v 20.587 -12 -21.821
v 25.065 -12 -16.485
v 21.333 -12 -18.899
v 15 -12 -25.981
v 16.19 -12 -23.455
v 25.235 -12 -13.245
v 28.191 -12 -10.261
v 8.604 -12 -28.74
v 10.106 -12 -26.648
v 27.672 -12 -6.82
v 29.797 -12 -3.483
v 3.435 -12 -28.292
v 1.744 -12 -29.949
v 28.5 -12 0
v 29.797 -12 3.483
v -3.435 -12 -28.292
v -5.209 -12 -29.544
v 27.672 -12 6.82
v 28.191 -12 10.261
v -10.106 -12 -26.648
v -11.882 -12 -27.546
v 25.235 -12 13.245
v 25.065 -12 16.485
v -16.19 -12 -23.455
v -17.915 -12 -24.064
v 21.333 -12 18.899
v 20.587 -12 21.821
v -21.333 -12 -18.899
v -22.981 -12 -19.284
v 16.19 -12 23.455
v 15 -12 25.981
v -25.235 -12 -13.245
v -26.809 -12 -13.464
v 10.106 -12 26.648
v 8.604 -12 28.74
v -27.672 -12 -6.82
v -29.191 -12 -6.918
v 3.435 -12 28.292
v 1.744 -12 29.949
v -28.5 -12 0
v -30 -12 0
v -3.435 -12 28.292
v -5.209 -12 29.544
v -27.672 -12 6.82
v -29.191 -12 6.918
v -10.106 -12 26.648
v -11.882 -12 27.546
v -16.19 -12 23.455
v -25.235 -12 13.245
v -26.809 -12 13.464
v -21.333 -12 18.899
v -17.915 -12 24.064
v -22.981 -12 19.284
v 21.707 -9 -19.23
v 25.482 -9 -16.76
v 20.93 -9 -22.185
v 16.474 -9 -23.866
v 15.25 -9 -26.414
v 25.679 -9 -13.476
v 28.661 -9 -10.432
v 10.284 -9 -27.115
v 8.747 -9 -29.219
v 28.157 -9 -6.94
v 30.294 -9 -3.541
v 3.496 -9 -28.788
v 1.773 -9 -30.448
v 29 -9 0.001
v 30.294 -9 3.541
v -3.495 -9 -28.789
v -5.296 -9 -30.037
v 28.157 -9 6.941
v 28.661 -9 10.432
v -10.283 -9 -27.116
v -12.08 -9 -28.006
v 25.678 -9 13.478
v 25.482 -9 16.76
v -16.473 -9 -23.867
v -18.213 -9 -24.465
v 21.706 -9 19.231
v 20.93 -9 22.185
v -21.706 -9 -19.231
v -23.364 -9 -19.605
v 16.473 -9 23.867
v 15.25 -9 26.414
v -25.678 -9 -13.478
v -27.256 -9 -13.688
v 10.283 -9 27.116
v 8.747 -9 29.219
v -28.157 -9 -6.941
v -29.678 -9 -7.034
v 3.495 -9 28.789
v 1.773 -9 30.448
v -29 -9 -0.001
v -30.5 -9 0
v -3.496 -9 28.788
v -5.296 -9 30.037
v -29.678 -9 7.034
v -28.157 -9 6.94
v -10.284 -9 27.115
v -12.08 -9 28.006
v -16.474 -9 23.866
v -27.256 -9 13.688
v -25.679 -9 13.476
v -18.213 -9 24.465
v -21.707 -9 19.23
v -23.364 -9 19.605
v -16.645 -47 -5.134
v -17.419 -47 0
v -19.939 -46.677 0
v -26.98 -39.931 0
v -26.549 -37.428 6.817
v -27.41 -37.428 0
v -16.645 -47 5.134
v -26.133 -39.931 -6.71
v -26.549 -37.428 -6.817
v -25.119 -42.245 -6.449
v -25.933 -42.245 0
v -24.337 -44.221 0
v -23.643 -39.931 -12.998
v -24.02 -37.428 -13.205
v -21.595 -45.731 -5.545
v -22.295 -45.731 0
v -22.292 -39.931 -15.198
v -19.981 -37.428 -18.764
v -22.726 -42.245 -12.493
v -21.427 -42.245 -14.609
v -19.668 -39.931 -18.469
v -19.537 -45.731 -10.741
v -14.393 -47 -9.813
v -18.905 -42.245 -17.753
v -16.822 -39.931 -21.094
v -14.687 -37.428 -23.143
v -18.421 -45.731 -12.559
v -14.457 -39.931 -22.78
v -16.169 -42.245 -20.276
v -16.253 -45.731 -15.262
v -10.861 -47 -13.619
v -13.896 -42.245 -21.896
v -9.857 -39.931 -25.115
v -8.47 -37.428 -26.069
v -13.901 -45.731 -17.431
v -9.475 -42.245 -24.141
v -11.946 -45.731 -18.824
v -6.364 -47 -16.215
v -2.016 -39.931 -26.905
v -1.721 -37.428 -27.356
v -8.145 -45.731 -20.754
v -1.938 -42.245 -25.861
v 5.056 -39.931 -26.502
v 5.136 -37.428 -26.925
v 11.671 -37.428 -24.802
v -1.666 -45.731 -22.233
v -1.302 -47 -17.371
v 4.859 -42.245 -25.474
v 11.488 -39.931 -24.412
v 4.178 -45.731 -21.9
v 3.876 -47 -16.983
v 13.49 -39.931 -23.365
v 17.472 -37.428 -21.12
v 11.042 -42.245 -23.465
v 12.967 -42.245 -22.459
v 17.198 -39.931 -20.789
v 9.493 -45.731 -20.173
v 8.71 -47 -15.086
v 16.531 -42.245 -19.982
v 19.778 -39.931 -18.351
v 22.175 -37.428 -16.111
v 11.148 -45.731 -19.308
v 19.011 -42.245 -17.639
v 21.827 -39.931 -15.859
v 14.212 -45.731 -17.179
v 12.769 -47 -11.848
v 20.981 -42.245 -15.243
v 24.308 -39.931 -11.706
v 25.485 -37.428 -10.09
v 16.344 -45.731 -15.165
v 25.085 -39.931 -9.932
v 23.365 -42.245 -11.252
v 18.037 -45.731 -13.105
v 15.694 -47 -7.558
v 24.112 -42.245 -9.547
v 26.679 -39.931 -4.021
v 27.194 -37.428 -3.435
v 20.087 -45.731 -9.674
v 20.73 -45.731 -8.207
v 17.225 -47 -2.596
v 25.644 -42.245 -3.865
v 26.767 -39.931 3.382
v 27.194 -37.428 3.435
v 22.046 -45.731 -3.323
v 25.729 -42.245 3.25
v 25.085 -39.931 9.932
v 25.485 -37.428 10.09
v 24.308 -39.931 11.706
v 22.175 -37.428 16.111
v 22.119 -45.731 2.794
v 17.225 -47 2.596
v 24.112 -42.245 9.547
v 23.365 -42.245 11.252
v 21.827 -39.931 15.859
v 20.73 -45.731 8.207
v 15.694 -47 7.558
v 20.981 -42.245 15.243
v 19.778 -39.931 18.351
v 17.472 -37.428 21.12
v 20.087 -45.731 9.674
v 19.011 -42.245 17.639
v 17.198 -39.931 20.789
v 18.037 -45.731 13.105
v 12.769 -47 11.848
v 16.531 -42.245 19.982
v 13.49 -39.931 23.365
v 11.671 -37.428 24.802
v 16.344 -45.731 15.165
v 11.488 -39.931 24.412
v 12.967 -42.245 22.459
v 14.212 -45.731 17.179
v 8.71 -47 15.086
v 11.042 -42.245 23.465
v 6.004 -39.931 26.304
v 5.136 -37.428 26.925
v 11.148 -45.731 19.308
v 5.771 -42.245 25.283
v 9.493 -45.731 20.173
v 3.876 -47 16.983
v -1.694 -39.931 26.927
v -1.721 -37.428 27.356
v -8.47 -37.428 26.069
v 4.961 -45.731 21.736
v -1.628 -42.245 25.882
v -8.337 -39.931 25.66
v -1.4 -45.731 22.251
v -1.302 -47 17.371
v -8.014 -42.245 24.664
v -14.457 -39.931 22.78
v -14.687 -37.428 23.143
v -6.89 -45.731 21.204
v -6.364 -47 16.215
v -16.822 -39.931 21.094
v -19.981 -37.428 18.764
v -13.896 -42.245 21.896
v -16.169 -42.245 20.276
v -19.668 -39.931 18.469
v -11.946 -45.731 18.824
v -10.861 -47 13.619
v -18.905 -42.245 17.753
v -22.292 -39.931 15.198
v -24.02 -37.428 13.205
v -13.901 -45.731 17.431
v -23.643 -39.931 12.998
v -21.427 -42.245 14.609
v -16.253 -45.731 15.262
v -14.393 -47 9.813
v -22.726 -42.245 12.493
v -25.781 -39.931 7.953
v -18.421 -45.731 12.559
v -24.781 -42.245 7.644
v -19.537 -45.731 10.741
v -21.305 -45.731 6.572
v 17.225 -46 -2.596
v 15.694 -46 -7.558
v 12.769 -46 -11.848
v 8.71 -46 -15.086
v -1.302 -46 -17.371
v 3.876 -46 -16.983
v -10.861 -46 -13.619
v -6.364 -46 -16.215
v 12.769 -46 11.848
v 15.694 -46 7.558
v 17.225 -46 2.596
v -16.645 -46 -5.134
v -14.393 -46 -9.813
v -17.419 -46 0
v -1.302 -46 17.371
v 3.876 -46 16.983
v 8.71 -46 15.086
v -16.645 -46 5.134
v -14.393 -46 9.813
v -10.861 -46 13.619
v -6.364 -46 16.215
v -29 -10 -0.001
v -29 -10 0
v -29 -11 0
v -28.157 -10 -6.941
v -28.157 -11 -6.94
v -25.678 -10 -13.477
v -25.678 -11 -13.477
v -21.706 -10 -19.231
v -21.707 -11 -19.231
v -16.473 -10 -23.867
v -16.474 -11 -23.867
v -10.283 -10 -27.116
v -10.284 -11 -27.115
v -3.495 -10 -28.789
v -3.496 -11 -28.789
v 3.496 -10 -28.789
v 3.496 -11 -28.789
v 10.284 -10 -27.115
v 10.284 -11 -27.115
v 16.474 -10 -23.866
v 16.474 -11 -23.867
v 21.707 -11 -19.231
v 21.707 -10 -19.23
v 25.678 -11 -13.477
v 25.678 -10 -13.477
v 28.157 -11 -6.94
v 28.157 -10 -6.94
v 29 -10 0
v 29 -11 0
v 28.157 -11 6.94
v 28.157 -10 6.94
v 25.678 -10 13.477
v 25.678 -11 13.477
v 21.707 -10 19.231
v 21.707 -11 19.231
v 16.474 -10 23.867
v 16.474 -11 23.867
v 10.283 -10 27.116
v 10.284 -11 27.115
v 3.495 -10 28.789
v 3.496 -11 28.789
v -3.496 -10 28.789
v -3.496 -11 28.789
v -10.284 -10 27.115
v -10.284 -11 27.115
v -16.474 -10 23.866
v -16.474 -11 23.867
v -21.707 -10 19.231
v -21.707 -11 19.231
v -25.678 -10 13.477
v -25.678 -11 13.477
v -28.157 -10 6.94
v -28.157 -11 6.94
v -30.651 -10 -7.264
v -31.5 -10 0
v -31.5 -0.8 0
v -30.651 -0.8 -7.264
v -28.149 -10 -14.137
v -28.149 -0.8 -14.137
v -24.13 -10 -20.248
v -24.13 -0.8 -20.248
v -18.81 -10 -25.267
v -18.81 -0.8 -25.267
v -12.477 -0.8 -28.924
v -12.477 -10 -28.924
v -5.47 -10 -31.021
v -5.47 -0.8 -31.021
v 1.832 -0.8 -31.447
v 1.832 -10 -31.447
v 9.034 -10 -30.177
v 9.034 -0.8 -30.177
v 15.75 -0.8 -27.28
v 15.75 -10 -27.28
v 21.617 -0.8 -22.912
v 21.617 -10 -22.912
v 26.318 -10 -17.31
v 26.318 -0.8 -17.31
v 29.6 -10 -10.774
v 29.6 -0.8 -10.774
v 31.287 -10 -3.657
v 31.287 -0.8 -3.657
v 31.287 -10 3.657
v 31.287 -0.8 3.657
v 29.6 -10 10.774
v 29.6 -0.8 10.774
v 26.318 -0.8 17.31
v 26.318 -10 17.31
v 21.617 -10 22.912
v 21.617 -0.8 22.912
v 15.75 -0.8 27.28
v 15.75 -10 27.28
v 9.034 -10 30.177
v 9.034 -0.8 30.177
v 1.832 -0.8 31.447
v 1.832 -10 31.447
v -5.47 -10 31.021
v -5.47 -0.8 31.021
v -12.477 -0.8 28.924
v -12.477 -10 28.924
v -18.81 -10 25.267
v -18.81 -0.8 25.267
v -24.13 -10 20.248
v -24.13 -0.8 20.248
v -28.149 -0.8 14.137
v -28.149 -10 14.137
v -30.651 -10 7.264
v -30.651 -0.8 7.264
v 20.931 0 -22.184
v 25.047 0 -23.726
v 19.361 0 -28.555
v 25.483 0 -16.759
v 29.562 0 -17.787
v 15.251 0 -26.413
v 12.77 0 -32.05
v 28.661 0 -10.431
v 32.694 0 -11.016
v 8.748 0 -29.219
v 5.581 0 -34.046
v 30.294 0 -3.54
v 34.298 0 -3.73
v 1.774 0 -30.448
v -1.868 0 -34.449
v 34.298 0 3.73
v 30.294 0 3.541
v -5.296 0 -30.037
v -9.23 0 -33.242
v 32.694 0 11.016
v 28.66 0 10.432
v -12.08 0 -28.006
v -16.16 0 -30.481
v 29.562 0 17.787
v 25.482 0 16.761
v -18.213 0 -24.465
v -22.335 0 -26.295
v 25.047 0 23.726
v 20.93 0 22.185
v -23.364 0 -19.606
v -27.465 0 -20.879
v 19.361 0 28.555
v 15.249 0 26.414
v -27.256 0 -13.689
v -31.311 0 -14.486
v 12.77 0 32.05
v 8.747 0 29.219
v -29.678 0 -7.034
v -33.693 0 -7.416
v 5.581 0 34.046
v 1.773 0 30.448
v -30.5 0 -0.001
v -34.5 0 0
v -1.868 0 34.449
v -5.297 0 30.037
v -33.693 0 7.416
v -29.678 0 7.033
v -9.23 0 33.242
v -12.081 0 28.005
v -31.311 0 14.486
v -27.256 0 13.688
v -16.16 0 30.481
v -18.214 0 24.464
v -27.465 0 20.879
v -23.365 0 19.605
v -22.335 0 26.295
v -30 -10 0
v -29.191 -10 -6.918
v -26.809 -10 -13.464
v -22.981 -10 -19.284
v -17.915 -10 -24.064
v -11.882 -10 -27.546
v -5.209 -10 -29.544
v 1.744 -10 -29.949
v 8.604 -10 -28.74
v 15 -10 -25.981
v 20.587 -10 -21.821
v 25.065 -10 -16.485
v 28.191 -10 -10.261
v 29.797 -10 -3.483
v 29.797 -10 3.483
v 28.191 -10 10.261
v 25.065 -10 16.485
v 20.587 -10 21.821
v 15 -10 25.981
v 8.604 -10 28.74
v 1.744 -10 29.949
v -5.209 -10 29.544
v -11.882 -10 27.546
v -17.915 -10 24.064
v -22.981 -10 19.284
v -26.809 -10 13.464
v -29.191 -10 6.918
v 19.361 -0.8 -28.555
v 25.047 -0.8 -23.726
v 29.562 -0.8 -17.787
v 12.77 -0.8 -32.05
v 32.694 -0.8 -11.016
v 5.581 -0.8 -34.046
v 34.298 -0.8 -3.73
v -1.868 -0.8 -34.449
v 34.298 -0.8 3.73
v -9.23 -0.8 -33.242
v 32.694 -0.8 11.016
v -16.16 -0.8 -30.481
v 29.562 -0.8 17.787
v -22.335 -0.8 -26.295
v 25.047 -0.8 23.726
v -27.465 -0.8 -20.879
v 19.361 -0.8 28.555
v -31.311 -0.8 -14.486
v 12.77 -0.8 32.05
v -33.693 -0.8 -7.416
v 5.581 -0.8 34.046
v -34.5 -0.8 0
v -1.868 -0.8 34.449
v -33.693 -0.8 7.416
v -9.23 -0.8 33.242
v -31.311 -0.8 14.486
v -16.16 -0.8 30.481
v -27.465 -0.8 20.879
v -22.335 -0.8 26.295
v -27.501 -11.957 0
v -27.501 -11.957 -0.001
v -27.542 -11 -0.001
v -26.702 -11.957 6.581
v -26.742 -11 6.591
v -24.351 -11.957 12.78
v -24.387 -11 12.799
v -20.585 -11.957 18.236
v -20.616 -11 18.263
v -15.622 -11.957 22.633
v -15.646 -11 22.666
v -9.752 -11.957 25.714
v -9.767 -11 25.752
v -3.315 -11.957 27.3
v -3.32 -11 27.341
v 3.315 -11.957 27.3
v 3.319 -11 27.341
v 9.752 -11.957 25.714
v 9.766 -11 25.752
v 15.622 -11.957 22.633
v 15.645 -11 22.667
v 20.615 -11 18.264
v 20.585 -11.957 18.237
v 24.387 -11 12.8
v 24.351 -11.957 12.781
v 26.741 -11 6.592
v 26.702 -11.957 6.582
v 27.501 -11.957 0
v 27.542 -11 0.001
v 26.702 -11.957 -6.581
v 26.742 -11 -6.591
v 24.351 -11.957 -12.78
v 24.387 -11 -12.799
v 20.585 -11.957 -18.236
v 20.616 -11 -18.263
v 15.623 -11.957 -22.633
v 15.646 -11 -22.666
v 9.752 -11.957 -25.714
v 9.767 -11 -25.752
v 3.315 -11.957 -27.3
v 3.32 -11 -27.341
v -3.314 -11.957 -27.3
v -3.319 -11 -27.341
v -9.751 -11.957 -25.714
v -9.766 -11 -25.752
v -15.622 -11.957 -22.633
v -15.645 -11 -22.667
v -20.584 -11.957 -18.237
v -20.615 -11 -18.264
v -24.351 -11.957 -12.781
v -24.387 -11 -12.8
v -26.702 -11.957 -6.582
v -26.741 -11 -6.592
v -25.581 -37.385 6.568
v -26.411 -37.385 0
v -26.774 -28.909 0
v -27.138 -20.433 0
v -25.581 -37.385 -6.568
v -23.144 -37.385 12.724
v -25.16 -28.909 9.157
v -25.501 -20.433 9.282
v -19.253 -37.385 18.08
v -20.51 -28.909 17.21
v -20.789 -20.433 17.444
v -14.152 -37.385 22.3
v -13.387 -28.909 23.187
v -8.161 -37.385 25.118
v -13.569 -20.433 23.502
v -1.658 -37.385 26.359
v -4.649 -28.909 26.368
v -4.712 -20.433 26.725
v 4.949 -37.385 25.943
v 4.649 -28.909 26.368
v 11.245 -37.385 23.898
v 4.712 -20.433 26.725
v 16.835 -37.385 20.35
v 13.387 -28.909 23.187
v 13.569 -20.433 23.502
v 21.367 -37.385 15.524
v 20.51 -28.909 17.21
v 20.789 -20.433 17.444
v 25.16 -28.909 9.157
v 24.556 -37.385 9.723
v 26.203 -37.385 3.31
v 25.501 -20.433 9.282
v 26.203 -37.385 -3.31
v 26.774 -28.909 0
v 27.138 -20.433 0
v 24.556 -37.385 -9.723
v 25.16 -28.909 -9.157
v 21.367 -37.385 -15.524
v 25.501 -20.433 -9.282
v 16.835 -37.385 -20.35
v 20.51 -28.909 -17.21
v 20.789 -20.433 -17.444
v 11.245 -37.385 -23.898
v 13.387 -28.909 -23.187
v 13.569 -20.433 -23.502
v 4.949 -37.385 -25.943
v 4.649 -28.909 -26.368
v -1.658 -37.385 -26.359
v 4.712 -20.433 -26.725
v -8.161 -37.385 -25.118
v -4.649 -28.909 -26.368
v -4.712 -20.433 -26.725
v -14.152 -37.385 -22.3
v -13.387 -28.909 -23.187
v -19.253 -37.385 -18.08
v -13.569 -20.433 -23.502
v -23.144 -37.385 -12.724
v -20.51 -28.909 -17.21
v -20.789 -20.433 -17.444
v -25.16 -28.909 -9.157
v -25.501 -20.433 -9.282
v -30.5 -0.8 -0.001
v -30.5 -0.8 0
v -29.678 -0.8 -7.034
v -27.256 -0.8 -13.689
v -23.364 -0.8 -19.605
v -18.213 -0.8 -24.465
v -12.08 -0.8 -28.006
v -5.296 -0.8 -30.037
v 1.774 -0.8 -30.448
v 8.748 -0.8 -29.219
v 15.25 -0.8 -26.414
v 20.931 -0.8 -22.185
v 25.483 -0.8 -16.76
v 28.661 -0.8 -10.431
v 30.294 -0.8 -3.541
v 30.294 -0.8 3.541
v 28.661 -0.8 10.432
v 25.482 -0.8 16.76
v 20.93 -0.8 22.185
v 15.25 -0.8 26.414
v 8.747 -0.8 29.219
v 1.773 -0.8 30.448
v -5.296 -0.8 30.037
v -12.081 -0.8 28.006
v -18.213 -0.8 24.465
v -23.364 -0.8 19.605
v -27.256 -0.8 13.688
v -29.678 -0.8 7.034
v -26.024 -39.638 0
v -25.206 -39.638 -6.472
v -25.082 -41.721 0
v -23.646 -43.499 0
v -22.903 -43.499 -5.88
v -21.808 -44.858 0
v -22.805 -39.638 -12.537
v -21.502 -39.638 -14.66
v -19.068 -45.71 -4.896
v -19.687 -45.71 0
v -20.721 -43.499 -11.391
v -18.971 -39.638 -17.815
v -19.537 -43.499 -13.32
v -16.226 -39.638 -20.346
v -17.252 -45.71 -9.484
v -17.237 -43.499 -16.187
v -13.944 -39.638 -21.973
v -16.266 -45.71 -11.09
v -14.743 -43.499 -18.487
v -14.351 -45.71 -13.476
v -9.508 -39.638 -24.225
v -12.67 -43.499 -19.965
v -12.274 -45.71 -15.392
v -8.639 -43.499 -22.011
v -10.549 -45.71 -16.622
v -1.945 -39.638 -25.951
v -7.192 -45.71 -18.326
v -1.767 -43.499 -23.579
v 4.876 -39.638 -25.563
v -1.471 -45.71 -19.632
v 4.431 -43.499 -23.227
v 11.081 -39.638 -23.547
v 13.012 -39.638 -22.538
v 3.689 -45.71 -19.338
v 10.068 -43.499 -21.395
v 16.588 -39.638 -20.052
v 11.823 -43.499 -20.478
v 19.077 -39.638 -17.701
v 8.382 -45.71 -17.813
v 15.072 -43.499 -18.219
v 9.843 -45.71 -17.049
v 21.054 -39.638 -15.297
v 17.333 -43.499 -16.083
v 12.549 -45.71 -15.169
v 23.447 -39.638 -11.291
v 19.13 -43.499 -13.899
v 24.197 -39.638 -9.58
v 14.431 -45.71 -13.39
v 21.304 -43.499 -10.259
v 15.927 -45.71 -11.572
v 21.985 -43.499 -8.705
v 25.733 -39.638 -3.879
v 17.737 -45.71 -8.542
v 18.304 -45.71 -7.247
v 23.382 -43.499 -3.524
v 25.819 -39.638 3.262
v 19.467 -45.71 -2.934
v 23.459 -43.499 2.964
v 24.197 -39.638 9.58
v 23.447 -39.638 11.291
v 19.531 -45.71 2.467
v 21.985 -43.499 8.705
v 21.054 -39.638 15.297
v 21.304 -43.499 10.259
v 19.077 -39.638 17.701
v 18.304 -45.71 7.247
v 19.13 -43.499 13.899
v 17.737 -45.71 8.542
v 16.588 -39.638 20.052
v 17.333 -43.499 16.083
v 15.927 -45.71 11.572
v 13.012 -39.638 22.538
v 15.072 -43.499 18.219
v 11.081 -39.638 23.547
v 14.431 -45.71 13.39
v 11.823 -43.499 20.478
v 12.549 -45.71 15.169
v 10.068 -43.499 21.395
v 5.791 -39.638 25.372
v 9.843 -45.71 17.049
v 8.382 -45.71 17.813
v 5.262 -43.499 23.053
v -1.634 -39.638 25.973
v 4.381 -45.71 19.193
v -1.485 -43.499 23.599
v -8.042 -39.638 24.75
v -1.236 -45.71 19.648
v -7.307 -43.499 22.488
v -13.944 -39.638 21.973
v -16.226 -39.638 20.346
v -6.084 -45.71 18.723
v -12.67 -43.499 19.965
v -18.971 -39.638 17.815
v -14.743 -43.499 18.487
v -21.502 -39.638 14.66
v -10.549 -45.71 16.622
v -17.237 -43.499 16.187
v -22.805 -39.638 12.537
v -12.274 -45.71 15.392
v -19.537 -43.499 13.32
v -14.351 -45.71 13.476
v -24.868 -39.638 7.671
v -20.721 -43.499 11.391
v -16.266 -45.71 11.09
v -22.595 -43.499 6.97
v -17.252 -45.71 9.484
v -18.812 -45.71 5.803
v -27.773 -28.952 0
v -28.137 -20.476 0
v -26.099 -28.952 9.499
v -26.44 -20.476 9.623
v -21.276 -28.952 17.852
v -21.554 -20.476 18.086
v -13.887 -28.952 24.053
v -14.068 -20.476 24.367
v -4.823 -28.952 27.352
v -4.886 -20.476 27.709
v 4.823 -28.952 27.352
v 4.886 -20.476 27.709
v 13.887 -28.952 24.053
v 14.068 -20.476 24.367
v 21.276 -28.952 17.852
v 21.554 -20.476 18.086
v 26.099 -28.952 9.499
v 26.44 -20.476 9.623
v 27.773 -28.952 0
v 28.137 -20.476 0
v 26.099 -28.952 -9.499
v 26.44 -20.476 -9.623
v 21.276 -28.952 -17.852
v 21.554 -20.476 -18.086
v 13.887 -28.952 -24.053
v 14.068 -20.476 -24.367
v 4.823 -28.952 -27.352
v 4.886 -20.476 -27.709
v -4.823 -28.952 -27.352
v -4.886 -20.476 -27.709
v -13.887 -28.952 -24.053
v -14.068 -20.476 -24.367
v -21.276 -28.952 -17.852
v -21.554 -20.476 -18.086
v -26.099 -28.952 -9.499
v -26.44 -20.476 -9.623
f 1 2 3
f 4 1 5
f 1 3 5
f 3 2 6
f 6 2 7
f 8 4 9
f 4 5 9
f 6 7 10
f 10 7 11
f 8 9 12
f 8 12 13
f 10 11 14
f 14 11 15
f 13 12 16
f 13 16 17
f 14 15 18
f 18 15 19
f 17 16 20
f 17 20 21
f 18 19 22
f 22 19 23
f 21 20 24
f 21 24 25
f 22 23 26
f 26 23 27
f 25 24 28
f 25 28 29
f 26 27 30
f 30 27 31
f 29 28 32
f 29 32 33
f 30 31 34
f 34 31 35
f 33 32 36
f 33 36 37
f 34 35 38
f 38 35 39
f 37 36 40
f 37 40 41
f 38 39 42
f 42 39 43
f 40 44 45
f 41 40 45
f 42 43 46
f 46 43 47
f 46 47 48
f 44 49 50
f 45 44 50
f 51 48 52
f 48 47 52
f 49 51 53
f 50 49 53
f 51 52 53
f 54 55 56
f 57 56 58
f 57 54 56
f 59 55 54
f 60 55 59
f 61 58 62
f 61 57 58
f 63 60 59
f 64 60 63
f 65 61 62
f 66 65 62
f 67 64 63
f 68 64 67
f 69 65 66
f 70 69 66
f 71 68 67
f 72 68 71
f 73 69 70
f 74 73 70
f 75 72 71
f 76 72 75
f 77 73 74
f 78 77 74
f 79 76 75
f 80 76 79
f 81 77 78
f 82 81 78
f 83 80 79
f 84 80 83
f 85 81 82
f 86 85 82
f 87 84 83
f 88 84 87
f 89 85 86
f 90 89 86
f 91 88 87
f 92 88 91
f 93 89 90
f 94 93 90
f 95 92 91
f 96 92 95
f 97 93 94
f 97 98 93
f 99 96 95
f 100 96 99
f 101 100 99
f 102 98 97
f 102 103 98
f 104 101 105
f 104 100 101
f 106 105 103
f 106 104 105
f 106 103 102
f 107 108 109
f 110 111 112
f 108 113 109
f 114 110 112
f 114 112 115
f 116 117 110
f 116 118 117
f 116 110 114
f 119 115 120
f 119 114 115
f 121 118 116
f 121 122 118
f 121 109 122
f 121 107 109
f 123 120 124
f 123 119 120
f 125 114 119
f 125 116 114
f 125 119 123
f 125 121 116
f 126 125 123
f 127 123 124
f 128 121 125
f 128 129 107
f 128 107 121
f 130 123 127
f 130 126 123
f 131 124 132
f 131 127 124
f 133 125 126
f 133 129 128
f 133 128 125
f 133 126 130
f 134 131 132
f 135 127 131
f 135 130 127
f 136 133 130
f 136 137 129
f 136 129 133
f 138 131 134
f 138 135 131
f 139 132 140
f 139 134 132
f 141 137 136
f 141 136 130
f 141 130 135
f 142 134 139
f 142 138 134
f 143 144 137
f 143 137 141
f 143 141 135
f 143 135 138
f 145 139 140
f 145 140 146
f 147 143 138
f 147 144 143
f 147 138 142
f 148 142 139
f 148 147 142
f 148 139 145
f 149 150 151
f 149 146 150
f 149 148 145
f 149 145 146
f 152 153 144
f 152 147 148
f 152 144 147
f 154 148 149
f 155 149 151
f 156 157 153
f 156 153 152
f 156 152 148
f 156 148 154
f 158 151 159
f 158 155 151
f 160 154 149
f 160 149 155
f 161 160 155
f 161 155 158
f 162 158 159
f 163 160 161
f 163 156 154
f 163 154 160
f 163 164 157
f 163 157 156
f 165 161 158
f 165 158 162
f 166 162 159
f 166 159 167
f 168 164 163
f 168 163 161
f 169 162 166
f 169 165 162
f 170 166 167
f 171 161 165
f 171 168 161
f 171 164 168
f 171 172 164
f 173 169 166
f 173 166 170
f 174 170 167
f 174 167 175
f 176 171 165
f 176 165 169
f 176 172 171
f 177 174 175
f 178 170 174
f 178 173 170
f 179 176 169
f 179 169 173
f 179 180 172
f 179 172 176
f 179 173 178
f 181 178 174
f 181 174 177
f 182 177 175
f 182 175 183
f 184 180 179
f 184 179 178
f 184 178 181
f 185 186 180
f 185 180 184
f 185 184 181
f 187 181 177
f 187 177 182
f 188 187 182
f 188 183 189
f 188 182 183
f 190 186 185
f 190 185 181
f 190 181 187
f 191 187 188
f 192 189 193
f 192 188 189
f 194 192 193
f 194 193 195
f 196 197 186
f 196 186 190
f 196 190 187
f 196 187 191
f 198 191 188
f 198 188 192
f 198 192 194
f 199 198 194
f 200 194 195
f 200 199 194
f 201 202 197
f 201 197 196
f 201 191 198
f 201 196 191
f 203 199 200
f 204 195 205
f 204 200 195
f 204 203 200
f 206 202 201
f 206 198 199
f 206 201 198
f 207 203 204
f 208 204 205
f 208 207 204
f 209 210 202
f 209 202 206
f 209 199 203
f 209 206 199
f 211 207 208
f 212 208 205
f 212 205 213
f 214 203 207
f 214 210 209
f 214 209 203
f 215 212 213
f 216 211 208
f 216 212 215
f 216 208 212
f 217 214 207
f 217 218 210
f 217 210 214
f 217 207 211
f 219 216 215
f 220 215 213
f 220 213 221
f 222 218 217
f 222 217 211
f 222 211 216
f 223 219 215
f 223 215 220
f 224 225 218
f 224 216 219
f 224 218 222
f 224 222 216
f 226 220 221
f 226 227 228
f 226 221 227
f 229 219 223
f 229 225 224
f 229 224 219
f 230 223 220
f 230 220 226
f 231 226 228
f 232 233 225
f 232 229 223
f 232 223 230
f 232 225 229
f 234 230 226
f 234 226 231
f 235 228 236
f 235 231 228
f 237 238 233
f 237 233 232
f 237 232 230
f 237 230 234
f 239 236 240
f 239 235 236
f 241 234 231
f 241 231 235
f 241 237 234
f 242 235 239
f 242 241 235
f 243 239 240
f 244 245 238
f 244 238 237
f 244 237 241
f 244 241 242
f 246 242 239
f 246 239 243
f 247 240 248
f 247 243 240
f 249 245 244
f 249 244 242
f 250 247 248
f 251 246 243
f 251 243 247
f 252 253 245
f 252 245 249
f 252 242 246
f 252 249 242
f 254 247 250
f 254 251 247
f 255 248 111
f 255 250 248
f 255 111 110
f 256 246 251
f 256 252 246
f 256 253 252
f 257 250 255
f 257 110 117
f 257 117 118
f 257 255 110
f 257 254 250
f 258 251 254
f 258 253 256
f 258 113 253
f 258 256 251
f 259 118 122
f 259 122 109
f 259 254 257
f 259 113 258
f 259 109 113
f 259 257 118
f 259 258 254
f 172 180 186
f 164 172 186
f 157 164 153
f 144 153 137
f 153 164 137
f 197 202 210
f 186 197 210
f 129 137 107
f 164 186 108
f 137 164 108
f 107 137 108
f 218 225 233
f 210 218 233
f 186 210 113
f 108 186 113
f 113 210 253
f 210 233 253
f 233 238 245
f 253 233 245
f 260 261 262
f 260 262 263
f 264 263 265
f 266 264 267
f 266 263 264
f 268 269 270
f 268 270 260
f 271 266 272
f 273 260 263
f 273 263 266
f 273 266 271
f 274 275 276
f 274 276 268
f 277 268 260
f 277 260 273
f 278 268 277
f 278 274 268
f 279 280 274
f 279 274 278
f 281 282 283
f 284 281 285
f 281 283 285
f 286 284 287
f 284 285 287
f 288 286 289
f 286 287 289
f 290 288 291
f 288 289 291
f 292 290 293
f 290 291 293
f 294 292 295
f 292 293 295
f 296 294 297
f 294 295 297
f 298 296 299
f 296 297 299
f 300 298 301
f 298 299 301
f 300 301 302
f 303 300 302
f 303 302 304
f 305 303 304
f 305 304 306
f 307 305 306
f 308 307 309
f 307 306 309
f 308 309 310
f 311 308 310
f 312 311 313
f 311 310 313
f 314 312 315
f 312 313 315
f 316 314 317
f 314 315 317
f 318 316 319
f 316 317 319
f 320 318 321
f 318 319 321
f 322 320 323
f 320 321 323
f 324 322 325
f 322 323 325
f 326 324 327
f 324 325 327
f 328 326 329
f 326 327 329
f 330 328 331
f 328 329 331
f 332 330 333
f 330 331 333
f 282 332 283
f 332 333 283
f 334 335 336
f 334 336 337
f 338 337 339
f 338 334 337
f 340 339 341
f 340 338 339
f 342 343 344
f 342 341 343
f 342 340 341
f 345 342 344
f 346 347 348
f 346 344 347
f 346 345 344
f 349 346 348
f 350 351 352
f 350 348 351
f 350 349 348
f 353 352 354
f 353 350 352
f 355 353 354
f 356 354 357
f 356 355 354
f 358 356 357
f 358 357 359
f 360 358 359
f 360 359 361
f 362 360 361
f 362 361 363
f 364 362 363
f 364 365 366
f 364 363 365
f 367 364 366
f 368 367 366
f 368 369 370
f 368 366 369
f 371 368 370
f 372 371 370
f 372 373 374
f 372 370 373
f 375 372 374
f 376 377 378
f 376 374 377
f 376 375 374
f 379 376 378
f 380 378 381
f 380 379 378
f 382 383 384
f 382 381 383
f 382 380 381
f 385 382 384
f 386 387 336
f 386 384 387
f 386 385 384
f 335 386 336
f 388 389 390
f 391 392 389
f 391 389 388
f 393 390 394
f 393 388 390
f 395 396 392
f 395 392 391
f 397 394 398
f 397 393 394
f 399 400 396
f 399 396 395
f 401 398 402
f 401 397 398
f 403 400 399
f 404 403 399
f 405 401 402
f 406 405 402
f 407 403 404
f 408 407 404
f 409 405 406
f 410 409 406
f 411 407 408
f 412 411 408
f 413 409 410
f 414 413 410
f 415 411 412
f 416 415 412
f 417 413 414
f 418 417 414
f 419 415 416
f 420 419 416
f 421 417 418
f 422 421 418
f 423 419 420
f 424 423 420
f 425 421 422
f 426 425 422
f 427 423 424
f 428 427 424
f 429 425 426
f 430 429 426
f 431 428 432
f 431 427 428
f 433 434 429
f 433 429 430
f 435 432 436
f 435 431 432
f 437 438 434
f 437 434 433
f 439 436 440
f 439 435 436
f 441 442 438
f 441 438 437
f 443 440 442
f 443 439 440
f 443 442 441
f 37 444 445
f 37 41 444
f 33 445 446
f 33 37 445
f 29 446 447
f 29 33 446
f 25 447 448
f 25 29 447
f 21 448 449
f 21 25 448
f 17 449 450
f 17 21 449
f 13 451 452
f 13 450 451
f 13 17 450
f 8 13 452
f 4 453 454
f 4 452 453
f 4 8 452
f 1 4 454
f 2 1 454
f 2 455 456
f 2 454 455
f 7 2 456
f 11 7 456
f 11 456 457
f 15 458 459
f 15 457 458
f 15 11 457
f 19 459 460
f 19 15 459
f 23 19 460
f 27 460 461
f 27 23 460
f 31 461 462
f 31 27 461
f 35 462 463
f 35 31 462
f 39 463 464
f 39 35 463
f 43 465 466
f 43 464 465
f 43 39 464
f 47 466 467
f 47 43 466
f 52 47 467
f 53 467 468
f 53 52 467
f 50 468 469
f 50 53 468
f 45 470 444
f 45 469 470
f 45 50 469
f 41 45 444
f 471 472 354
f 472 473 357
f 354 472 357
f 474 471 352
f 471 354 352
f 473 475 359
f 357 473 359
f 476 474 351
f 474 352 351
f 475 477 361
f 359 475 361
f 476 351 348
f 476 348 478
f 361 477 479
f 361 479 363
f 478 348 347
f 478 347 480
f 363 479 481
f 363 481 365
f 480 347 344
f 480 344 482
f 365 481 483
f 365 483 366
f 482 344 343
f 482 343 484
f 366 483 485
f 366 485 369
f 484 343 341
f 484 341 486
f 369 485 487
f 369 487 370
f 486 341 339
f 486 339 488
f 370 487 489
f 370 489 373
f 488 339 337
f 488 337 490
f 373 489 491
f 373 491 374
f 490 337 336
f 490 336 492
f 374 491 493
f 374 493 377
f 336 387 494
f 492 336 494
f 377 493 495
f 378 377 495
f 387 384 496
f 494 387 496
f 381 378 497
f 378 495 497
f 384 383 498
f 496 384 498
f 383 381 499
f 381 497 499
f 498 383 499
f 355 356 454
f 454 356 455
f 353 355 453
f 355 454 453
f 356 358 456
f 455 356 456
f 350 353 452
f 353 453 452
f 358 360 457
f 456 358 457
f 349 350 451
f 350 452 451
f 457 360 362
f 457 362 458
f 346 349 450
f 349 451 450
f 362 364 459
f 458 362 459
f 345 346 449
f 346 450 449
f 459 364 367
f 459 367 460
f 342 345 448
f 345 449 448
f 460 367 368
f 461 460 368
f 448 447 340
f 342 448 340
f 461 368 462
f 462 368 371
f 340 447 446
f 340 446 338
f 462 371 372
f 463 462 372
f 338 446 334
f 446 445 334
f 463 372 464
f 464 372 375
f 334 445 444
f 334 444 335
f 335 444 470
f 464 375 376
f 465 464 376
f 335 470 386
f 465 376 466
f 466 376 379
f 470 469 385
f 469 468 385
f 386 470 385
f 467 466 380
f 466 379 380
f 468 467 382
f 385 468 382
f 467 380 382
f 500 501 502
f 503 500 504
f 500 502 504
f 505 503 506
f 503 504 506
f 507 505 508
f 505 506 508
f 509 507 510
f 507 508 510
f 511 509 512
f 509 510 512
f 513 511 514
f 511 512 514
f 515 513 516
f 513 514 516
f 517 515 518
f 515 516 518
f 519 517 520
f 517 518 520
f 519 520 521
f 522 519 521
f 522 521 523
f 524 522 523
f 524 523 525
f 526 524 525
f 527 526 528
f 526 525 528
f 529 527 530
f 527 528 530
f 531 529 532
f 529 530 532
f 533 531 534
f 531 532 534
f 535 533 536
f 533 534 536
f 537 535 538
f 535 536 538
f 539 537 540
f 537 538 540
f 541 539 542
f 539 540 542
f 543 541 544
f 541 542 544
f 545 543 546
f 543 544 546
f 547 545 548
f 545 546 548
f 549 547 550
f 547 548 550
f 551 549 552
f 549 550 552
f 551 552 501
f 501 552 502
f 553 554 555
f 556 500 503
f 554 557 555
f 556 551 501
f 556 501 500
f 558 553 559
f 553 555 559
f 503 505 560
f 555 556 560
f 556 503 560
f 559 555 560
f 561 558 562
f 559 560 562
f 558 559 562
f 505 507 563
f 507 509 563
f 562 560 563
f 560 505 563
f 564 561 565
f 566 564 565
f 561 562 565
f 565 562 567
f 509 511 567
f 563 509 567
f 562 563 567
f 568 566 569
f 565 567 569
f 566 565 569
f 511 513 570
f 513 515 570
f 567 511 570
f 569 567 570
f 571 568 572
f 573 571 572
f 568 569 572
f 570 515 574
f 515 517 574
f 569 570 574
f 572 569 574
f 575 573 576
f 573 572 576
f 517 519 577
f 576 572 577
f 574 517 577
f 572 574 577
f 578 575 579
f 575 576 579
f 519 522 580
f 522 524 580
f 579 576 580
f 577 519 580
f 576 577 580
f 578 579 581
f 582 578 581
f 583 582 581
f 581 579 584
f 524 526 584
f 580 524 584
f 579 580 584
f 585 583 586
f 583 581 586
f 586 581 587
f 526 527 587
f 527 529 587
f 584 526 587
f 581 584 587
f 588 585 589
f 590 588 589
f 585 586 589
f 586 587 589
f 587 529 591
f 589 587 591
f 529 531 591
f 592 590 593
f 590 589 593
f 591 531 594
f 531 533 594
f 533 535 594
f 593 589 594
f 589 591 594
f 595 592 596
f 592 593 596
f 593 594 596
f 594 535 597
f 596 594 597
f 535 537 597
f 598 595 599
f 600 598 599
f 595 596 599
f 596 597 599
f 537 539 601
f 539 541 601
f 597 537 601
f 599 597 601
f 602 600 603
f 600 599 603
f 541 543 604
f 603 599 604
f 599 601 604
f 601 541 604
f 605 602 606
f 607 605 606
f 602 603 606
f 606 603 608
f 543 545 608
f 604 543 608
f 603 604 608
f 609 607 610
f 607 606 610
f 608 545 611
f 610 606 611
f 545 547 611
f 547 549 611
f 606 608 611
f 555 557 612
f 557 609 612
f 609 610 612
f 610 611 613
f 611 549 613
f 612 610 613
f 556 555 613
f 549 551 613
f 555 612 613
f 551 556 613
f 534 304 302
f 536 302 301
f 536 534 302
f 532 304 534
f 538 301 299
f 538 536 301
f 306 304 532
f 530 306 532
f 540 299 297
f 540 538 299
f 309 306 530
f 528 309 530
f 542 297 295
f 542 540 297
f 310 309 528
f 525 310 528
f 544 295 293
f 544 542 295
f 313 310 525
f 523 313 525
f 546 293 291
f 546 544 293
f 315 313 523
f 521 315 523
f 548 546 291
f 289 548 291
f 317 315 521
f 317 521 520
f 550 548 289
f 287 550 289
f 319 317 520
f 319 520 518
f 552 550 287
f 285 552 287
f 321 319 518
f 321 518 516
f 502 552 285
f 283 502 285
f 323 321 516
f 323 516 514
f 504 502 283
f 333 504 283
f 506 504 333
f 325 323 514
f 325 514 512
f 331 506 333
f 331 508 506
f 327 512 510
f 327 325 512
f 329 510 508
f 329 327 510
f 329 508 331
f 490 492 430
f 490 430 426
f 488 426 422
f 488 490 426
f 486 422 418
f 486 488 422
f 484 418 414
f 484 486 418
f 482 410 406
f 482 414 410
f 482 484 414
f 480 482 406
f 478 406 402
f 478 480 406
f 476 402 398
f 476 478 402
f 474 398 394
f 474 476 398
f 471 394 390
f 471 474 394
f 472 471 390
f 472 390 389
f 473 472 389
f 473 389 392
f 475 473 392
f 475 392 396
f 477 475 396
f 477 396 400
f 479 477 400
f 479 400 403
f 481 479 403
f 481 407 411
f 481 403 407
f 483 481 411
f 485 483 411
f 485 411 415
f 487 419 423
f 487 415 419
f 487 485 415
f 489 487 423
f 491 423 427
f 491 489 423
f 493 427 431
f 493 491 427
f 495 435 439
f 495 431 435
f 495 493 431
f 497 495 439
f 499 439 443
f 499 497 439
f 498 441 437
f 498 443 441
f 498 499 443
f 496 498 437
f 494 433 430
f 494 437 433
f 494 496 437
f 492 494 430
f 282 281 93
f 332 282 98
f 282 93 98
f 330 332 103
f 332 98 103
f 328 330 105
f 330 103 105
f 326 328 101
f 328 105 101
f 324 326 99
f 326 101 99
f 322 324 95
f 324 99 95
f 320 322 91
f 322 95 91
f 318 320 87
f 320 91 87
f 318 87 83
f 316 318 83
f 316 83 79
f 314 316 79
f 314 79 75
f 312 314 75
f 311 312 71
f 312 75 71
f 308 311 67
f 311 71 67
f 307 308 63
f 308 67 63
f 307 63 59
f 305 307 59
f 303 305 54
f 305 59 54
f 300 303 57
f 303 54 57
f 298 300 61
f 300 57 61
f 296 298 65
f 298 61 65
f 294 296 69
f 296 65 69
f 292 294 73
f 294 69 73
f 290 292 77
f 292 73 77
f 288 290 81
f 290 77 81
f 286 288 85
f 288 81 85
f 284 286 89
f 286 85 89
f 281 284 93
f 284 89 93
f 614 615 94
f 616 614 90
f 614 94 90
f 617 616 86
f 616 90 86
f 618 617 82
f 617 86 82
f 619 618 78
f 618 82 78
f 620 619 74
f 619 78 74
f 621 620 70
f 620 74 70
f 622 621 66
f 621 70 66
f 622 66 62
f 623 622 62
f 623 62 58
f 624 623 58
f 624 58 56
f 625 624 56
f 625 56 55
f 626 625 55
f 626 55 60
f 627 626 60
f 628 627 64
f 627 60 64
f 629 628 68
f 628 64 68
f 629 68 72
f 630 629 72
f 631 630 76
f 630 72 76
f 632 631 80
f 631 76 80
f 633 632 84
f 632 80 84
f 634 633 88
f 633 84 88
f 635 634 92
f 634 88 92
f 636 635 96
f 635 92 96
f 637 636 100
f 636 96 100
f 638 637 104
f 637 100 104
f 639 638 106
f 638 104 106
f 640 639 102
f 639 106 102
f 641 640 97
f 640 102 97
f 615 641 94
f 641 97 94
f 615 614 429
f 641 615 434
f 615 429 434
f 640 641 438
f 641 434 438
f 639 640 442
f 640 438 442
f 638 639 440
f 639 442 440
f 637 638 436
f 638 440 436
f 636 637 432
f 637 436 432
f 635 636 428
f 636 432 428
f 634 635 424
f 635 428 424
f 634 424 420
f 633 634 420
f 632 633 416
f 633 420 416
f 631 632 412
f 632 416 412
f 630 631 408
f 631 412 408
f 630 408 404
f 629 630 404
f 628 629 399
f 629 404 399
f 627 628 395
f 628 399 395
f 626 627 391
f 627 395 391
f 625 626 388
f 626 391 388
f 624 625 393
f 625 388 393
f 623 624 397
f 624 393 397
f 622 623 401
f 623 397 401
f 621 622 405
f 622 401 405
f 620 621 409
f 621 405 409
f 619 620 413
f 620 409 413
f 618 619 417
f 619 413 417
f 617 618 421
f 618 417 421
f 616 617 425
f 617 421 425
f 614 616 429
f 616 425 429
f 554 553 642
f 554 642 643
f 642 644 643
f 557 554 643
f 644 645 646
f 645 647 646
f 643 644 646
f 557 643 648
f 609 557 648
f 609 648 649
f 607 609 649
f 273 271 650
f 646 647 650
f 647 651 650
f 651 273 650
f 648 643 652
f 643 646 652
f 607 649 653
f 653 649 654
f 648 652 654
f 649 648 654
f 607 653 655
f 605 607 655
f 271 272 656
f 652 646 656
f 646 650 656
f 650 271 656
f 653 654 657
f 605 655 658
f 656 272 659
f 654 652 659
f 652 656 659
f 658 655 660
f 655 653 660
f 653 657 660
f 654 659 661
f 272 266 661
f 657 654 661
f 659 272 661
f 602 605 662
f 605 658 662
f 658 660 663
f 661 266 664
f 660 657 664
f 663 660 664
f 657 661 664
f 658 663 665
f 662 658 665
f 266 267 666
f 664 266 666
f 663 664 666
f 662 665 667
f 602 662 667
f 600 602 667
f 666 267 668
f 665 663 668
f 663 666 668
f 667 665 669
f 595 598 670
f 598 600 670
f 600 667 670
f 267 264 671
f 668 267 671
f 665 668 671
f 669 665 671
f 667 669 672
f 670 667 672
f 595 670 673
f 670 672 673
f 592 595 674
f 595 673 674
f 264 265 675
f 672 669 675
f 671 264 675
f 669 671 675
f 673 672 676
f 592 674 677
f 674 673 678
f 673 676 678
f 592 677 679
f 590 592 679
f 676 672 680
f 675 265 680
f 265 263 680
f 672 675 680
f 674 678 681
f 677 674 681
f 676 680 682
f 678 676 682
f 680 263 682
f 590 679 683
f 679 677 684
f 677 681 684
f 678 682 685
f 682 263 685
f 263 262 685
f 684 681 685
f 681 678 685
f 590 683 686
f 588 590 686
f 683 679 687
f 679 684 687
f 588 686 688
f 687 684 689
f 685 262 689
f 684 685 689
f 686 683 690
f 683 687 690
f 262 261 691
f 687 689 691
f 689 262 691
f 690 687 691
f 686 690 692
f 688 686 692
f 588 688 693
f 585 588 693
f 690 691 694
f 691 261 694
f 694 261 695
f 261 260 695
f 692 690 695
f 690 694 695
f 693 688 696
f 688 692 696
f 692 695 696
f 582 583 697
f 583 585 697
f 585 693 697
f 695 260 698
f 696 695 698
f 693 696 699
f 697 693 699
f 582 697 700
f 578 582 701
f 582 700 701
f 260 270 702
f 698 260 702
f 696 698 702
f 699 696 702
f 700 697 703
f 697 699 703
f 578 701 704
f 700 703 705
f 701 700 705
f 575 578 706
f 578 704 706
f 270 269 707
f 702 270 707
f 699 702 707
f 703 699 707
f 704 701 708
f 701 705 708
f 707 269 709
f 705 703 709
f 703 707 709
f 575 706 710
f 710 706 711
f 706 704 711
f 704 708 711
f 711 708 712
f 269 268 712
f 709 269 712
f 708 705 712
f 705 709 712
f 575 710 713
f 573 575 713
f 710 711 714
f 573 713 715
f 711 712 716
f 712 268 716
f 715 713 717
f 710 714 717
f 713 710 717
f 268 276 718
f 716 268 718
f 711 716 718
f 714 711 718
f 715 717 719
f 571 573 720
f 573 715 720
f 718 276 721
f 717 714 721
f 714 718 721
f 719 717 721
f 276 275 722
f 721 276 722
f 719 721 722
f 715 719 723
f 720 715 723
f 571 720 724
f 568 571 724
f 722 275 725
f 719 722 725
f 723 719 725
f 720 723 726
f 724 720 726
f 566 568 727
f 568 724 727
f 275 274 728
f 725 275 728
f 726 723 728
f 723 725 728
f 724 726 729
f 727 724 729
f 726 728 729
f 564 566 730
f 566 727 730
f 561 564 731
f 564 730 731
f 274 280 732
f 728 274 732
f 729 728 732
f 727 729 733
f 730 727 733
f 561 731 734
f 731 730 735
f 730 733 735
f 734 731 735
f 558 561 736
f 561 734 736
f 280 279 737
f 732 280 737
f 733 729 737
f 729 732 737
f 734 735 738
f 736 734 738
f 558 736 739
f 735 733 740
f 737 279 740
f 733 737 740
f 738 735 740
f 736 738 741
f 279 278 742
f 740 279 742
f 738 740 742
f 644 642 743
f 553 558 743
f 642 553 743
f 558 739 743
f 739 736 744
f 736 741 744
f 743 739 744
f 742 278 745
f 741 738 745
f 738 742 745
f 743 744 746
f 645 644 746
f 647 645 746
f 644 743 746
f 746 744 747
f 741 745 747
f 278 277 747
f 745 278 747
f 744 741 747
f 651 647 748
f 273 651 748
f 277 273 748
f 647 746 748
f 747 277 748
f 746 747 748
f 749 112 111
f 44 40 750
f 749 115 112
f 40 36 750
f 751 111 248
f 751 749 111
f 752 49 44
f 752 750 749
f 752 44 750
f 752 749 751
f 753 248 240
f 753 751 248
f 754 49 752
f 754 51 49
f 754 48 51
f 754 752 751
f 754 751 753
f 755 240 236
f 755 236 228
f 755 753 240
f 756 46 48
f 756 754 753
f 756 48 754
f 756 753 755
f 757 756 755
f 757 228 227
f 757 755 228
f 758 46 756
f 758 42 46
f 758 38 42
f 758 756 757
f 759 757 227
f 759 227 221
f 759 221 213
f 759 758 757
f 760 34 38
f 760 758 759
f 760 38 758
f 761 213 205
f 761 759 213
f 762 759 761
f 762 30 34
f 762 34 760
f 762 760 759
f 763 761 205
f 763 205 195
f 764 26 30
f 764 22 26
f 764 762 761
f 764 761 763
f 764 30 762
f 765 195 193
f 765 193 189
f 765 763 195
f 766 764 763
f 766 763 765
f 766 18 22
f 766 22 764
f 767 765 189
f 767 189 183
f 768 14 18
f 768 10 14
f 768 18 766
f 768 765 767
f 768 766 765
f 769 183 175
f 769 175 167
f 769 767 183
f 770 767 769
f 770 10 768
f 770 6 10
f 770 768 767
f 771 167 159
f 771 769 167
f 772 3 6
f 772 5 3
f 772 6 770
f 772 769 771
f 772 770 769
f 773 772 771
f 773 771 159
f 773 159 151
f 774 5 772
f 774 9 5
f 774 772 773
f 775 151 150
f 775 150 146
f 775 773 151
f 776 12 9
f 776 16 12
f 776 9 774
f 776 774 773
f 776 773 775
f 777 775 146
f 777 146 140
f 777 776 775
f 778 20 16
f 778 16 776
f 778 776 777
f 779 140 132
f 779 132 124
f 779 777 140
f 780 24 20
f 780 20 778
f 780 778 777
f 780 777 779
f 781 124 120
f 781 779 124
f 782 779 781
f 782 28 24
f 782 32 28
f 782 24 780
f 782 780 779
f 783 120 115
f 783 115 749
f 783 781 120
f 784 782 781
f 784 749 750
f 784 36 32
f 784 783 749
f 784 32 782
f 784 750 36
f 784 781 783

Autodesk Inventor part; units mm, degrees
ref_plane "YZ Plane" through (0, 0, 0) normal (1, 0, 0) x (0, 1, 0)
ref_plane "XZ Plane" through (0, 0, 0) normal (0, 1, 0) x (-1, 0, 0)
ref_plane "XY Plane" through (0, 0, 0) normal (0, 0, 1) x (1, 0, 0)
sketch "草圖1" plane through (0, 0, 0) normal (0, 0, 1) x (1, 0, 0)
  line L0 (0, 0) -> (-34.5, 0)
  line L1 (-34.5, 0) -> (-34.5, -0.8)
  line L2 (-34.5, -0.8) -> (0, -0.8)
  line L3 (0, -0.8) -> (0, 0)
  line L4 (0, -0.8) -> (-31.5, -0.8)
  line L5 (-31.5, -0.8) -> (-31.5, -10)
  line L6 (-31.5, -10) -> (0, -10)
  line L7 (0, -10) -> (0, -0.8)
  line L8 (0, -10) -> (-30, -10)
  line L9 (-30, -10) -> (-30, -12)
  line L10 (-30, -12) -> (0, -12)
  line L11 (0, -12) -> (0, -10)
  line L12 (-18.0931, -47) -> (0, -47)
  line L13 (0, -47) -> (0, -12)
  line L14 (0, -47) -> (-20, -47)
  line L15 (-20, -47) -> (-20, -50)
  line L16 (-20, -50) -> (0, -50)
  line L17 (0, -50) -> (0, -47)
  line L18 (0, -50) -> (-19.9, -50)
  line L19 (-19.9, -50) -> (-19.9, -55)
  line L20 (-19.9, -55) -> (0, -55)
  line L21 (0, -55) -> (0, -50)
  line L22 (0, -47) -> (-27, -47)
  line L23 (-27, -47) -> (-28.5, -12)
  dimension "d0" = 0.8
  dimension "d1" = 34.5
  dimension "d2" = 20
  dimension "d3" = 31.5
  dimension "d4" = 30
  dimension "d5" = 9.2
  dimension "d6" = 2
  dimension "d8" = 3
  dimension "d9" = 28.5
  dimension "d10" = 27
  dimension "d11" = 19.9
  dimension "d12" = 35
  dimension "d13" = 5
revolve "迴轉1" add sketch "草圖1" angle 360 about axis through (0, -47, 0) along (0, 1, 0) contours L3 L2 L1 L0 | L7 L6 L5 L2 | L11 L10 L9 L6 | L13 L12 L14 L22 L23 L10
fillet "圓角1" radius 10 1 edges at (27, -47, 0)
shell "薄殼1" thickness 1 removed faces 1 at (11.3362, 0, -5.1612)
properties part number "布丁"
